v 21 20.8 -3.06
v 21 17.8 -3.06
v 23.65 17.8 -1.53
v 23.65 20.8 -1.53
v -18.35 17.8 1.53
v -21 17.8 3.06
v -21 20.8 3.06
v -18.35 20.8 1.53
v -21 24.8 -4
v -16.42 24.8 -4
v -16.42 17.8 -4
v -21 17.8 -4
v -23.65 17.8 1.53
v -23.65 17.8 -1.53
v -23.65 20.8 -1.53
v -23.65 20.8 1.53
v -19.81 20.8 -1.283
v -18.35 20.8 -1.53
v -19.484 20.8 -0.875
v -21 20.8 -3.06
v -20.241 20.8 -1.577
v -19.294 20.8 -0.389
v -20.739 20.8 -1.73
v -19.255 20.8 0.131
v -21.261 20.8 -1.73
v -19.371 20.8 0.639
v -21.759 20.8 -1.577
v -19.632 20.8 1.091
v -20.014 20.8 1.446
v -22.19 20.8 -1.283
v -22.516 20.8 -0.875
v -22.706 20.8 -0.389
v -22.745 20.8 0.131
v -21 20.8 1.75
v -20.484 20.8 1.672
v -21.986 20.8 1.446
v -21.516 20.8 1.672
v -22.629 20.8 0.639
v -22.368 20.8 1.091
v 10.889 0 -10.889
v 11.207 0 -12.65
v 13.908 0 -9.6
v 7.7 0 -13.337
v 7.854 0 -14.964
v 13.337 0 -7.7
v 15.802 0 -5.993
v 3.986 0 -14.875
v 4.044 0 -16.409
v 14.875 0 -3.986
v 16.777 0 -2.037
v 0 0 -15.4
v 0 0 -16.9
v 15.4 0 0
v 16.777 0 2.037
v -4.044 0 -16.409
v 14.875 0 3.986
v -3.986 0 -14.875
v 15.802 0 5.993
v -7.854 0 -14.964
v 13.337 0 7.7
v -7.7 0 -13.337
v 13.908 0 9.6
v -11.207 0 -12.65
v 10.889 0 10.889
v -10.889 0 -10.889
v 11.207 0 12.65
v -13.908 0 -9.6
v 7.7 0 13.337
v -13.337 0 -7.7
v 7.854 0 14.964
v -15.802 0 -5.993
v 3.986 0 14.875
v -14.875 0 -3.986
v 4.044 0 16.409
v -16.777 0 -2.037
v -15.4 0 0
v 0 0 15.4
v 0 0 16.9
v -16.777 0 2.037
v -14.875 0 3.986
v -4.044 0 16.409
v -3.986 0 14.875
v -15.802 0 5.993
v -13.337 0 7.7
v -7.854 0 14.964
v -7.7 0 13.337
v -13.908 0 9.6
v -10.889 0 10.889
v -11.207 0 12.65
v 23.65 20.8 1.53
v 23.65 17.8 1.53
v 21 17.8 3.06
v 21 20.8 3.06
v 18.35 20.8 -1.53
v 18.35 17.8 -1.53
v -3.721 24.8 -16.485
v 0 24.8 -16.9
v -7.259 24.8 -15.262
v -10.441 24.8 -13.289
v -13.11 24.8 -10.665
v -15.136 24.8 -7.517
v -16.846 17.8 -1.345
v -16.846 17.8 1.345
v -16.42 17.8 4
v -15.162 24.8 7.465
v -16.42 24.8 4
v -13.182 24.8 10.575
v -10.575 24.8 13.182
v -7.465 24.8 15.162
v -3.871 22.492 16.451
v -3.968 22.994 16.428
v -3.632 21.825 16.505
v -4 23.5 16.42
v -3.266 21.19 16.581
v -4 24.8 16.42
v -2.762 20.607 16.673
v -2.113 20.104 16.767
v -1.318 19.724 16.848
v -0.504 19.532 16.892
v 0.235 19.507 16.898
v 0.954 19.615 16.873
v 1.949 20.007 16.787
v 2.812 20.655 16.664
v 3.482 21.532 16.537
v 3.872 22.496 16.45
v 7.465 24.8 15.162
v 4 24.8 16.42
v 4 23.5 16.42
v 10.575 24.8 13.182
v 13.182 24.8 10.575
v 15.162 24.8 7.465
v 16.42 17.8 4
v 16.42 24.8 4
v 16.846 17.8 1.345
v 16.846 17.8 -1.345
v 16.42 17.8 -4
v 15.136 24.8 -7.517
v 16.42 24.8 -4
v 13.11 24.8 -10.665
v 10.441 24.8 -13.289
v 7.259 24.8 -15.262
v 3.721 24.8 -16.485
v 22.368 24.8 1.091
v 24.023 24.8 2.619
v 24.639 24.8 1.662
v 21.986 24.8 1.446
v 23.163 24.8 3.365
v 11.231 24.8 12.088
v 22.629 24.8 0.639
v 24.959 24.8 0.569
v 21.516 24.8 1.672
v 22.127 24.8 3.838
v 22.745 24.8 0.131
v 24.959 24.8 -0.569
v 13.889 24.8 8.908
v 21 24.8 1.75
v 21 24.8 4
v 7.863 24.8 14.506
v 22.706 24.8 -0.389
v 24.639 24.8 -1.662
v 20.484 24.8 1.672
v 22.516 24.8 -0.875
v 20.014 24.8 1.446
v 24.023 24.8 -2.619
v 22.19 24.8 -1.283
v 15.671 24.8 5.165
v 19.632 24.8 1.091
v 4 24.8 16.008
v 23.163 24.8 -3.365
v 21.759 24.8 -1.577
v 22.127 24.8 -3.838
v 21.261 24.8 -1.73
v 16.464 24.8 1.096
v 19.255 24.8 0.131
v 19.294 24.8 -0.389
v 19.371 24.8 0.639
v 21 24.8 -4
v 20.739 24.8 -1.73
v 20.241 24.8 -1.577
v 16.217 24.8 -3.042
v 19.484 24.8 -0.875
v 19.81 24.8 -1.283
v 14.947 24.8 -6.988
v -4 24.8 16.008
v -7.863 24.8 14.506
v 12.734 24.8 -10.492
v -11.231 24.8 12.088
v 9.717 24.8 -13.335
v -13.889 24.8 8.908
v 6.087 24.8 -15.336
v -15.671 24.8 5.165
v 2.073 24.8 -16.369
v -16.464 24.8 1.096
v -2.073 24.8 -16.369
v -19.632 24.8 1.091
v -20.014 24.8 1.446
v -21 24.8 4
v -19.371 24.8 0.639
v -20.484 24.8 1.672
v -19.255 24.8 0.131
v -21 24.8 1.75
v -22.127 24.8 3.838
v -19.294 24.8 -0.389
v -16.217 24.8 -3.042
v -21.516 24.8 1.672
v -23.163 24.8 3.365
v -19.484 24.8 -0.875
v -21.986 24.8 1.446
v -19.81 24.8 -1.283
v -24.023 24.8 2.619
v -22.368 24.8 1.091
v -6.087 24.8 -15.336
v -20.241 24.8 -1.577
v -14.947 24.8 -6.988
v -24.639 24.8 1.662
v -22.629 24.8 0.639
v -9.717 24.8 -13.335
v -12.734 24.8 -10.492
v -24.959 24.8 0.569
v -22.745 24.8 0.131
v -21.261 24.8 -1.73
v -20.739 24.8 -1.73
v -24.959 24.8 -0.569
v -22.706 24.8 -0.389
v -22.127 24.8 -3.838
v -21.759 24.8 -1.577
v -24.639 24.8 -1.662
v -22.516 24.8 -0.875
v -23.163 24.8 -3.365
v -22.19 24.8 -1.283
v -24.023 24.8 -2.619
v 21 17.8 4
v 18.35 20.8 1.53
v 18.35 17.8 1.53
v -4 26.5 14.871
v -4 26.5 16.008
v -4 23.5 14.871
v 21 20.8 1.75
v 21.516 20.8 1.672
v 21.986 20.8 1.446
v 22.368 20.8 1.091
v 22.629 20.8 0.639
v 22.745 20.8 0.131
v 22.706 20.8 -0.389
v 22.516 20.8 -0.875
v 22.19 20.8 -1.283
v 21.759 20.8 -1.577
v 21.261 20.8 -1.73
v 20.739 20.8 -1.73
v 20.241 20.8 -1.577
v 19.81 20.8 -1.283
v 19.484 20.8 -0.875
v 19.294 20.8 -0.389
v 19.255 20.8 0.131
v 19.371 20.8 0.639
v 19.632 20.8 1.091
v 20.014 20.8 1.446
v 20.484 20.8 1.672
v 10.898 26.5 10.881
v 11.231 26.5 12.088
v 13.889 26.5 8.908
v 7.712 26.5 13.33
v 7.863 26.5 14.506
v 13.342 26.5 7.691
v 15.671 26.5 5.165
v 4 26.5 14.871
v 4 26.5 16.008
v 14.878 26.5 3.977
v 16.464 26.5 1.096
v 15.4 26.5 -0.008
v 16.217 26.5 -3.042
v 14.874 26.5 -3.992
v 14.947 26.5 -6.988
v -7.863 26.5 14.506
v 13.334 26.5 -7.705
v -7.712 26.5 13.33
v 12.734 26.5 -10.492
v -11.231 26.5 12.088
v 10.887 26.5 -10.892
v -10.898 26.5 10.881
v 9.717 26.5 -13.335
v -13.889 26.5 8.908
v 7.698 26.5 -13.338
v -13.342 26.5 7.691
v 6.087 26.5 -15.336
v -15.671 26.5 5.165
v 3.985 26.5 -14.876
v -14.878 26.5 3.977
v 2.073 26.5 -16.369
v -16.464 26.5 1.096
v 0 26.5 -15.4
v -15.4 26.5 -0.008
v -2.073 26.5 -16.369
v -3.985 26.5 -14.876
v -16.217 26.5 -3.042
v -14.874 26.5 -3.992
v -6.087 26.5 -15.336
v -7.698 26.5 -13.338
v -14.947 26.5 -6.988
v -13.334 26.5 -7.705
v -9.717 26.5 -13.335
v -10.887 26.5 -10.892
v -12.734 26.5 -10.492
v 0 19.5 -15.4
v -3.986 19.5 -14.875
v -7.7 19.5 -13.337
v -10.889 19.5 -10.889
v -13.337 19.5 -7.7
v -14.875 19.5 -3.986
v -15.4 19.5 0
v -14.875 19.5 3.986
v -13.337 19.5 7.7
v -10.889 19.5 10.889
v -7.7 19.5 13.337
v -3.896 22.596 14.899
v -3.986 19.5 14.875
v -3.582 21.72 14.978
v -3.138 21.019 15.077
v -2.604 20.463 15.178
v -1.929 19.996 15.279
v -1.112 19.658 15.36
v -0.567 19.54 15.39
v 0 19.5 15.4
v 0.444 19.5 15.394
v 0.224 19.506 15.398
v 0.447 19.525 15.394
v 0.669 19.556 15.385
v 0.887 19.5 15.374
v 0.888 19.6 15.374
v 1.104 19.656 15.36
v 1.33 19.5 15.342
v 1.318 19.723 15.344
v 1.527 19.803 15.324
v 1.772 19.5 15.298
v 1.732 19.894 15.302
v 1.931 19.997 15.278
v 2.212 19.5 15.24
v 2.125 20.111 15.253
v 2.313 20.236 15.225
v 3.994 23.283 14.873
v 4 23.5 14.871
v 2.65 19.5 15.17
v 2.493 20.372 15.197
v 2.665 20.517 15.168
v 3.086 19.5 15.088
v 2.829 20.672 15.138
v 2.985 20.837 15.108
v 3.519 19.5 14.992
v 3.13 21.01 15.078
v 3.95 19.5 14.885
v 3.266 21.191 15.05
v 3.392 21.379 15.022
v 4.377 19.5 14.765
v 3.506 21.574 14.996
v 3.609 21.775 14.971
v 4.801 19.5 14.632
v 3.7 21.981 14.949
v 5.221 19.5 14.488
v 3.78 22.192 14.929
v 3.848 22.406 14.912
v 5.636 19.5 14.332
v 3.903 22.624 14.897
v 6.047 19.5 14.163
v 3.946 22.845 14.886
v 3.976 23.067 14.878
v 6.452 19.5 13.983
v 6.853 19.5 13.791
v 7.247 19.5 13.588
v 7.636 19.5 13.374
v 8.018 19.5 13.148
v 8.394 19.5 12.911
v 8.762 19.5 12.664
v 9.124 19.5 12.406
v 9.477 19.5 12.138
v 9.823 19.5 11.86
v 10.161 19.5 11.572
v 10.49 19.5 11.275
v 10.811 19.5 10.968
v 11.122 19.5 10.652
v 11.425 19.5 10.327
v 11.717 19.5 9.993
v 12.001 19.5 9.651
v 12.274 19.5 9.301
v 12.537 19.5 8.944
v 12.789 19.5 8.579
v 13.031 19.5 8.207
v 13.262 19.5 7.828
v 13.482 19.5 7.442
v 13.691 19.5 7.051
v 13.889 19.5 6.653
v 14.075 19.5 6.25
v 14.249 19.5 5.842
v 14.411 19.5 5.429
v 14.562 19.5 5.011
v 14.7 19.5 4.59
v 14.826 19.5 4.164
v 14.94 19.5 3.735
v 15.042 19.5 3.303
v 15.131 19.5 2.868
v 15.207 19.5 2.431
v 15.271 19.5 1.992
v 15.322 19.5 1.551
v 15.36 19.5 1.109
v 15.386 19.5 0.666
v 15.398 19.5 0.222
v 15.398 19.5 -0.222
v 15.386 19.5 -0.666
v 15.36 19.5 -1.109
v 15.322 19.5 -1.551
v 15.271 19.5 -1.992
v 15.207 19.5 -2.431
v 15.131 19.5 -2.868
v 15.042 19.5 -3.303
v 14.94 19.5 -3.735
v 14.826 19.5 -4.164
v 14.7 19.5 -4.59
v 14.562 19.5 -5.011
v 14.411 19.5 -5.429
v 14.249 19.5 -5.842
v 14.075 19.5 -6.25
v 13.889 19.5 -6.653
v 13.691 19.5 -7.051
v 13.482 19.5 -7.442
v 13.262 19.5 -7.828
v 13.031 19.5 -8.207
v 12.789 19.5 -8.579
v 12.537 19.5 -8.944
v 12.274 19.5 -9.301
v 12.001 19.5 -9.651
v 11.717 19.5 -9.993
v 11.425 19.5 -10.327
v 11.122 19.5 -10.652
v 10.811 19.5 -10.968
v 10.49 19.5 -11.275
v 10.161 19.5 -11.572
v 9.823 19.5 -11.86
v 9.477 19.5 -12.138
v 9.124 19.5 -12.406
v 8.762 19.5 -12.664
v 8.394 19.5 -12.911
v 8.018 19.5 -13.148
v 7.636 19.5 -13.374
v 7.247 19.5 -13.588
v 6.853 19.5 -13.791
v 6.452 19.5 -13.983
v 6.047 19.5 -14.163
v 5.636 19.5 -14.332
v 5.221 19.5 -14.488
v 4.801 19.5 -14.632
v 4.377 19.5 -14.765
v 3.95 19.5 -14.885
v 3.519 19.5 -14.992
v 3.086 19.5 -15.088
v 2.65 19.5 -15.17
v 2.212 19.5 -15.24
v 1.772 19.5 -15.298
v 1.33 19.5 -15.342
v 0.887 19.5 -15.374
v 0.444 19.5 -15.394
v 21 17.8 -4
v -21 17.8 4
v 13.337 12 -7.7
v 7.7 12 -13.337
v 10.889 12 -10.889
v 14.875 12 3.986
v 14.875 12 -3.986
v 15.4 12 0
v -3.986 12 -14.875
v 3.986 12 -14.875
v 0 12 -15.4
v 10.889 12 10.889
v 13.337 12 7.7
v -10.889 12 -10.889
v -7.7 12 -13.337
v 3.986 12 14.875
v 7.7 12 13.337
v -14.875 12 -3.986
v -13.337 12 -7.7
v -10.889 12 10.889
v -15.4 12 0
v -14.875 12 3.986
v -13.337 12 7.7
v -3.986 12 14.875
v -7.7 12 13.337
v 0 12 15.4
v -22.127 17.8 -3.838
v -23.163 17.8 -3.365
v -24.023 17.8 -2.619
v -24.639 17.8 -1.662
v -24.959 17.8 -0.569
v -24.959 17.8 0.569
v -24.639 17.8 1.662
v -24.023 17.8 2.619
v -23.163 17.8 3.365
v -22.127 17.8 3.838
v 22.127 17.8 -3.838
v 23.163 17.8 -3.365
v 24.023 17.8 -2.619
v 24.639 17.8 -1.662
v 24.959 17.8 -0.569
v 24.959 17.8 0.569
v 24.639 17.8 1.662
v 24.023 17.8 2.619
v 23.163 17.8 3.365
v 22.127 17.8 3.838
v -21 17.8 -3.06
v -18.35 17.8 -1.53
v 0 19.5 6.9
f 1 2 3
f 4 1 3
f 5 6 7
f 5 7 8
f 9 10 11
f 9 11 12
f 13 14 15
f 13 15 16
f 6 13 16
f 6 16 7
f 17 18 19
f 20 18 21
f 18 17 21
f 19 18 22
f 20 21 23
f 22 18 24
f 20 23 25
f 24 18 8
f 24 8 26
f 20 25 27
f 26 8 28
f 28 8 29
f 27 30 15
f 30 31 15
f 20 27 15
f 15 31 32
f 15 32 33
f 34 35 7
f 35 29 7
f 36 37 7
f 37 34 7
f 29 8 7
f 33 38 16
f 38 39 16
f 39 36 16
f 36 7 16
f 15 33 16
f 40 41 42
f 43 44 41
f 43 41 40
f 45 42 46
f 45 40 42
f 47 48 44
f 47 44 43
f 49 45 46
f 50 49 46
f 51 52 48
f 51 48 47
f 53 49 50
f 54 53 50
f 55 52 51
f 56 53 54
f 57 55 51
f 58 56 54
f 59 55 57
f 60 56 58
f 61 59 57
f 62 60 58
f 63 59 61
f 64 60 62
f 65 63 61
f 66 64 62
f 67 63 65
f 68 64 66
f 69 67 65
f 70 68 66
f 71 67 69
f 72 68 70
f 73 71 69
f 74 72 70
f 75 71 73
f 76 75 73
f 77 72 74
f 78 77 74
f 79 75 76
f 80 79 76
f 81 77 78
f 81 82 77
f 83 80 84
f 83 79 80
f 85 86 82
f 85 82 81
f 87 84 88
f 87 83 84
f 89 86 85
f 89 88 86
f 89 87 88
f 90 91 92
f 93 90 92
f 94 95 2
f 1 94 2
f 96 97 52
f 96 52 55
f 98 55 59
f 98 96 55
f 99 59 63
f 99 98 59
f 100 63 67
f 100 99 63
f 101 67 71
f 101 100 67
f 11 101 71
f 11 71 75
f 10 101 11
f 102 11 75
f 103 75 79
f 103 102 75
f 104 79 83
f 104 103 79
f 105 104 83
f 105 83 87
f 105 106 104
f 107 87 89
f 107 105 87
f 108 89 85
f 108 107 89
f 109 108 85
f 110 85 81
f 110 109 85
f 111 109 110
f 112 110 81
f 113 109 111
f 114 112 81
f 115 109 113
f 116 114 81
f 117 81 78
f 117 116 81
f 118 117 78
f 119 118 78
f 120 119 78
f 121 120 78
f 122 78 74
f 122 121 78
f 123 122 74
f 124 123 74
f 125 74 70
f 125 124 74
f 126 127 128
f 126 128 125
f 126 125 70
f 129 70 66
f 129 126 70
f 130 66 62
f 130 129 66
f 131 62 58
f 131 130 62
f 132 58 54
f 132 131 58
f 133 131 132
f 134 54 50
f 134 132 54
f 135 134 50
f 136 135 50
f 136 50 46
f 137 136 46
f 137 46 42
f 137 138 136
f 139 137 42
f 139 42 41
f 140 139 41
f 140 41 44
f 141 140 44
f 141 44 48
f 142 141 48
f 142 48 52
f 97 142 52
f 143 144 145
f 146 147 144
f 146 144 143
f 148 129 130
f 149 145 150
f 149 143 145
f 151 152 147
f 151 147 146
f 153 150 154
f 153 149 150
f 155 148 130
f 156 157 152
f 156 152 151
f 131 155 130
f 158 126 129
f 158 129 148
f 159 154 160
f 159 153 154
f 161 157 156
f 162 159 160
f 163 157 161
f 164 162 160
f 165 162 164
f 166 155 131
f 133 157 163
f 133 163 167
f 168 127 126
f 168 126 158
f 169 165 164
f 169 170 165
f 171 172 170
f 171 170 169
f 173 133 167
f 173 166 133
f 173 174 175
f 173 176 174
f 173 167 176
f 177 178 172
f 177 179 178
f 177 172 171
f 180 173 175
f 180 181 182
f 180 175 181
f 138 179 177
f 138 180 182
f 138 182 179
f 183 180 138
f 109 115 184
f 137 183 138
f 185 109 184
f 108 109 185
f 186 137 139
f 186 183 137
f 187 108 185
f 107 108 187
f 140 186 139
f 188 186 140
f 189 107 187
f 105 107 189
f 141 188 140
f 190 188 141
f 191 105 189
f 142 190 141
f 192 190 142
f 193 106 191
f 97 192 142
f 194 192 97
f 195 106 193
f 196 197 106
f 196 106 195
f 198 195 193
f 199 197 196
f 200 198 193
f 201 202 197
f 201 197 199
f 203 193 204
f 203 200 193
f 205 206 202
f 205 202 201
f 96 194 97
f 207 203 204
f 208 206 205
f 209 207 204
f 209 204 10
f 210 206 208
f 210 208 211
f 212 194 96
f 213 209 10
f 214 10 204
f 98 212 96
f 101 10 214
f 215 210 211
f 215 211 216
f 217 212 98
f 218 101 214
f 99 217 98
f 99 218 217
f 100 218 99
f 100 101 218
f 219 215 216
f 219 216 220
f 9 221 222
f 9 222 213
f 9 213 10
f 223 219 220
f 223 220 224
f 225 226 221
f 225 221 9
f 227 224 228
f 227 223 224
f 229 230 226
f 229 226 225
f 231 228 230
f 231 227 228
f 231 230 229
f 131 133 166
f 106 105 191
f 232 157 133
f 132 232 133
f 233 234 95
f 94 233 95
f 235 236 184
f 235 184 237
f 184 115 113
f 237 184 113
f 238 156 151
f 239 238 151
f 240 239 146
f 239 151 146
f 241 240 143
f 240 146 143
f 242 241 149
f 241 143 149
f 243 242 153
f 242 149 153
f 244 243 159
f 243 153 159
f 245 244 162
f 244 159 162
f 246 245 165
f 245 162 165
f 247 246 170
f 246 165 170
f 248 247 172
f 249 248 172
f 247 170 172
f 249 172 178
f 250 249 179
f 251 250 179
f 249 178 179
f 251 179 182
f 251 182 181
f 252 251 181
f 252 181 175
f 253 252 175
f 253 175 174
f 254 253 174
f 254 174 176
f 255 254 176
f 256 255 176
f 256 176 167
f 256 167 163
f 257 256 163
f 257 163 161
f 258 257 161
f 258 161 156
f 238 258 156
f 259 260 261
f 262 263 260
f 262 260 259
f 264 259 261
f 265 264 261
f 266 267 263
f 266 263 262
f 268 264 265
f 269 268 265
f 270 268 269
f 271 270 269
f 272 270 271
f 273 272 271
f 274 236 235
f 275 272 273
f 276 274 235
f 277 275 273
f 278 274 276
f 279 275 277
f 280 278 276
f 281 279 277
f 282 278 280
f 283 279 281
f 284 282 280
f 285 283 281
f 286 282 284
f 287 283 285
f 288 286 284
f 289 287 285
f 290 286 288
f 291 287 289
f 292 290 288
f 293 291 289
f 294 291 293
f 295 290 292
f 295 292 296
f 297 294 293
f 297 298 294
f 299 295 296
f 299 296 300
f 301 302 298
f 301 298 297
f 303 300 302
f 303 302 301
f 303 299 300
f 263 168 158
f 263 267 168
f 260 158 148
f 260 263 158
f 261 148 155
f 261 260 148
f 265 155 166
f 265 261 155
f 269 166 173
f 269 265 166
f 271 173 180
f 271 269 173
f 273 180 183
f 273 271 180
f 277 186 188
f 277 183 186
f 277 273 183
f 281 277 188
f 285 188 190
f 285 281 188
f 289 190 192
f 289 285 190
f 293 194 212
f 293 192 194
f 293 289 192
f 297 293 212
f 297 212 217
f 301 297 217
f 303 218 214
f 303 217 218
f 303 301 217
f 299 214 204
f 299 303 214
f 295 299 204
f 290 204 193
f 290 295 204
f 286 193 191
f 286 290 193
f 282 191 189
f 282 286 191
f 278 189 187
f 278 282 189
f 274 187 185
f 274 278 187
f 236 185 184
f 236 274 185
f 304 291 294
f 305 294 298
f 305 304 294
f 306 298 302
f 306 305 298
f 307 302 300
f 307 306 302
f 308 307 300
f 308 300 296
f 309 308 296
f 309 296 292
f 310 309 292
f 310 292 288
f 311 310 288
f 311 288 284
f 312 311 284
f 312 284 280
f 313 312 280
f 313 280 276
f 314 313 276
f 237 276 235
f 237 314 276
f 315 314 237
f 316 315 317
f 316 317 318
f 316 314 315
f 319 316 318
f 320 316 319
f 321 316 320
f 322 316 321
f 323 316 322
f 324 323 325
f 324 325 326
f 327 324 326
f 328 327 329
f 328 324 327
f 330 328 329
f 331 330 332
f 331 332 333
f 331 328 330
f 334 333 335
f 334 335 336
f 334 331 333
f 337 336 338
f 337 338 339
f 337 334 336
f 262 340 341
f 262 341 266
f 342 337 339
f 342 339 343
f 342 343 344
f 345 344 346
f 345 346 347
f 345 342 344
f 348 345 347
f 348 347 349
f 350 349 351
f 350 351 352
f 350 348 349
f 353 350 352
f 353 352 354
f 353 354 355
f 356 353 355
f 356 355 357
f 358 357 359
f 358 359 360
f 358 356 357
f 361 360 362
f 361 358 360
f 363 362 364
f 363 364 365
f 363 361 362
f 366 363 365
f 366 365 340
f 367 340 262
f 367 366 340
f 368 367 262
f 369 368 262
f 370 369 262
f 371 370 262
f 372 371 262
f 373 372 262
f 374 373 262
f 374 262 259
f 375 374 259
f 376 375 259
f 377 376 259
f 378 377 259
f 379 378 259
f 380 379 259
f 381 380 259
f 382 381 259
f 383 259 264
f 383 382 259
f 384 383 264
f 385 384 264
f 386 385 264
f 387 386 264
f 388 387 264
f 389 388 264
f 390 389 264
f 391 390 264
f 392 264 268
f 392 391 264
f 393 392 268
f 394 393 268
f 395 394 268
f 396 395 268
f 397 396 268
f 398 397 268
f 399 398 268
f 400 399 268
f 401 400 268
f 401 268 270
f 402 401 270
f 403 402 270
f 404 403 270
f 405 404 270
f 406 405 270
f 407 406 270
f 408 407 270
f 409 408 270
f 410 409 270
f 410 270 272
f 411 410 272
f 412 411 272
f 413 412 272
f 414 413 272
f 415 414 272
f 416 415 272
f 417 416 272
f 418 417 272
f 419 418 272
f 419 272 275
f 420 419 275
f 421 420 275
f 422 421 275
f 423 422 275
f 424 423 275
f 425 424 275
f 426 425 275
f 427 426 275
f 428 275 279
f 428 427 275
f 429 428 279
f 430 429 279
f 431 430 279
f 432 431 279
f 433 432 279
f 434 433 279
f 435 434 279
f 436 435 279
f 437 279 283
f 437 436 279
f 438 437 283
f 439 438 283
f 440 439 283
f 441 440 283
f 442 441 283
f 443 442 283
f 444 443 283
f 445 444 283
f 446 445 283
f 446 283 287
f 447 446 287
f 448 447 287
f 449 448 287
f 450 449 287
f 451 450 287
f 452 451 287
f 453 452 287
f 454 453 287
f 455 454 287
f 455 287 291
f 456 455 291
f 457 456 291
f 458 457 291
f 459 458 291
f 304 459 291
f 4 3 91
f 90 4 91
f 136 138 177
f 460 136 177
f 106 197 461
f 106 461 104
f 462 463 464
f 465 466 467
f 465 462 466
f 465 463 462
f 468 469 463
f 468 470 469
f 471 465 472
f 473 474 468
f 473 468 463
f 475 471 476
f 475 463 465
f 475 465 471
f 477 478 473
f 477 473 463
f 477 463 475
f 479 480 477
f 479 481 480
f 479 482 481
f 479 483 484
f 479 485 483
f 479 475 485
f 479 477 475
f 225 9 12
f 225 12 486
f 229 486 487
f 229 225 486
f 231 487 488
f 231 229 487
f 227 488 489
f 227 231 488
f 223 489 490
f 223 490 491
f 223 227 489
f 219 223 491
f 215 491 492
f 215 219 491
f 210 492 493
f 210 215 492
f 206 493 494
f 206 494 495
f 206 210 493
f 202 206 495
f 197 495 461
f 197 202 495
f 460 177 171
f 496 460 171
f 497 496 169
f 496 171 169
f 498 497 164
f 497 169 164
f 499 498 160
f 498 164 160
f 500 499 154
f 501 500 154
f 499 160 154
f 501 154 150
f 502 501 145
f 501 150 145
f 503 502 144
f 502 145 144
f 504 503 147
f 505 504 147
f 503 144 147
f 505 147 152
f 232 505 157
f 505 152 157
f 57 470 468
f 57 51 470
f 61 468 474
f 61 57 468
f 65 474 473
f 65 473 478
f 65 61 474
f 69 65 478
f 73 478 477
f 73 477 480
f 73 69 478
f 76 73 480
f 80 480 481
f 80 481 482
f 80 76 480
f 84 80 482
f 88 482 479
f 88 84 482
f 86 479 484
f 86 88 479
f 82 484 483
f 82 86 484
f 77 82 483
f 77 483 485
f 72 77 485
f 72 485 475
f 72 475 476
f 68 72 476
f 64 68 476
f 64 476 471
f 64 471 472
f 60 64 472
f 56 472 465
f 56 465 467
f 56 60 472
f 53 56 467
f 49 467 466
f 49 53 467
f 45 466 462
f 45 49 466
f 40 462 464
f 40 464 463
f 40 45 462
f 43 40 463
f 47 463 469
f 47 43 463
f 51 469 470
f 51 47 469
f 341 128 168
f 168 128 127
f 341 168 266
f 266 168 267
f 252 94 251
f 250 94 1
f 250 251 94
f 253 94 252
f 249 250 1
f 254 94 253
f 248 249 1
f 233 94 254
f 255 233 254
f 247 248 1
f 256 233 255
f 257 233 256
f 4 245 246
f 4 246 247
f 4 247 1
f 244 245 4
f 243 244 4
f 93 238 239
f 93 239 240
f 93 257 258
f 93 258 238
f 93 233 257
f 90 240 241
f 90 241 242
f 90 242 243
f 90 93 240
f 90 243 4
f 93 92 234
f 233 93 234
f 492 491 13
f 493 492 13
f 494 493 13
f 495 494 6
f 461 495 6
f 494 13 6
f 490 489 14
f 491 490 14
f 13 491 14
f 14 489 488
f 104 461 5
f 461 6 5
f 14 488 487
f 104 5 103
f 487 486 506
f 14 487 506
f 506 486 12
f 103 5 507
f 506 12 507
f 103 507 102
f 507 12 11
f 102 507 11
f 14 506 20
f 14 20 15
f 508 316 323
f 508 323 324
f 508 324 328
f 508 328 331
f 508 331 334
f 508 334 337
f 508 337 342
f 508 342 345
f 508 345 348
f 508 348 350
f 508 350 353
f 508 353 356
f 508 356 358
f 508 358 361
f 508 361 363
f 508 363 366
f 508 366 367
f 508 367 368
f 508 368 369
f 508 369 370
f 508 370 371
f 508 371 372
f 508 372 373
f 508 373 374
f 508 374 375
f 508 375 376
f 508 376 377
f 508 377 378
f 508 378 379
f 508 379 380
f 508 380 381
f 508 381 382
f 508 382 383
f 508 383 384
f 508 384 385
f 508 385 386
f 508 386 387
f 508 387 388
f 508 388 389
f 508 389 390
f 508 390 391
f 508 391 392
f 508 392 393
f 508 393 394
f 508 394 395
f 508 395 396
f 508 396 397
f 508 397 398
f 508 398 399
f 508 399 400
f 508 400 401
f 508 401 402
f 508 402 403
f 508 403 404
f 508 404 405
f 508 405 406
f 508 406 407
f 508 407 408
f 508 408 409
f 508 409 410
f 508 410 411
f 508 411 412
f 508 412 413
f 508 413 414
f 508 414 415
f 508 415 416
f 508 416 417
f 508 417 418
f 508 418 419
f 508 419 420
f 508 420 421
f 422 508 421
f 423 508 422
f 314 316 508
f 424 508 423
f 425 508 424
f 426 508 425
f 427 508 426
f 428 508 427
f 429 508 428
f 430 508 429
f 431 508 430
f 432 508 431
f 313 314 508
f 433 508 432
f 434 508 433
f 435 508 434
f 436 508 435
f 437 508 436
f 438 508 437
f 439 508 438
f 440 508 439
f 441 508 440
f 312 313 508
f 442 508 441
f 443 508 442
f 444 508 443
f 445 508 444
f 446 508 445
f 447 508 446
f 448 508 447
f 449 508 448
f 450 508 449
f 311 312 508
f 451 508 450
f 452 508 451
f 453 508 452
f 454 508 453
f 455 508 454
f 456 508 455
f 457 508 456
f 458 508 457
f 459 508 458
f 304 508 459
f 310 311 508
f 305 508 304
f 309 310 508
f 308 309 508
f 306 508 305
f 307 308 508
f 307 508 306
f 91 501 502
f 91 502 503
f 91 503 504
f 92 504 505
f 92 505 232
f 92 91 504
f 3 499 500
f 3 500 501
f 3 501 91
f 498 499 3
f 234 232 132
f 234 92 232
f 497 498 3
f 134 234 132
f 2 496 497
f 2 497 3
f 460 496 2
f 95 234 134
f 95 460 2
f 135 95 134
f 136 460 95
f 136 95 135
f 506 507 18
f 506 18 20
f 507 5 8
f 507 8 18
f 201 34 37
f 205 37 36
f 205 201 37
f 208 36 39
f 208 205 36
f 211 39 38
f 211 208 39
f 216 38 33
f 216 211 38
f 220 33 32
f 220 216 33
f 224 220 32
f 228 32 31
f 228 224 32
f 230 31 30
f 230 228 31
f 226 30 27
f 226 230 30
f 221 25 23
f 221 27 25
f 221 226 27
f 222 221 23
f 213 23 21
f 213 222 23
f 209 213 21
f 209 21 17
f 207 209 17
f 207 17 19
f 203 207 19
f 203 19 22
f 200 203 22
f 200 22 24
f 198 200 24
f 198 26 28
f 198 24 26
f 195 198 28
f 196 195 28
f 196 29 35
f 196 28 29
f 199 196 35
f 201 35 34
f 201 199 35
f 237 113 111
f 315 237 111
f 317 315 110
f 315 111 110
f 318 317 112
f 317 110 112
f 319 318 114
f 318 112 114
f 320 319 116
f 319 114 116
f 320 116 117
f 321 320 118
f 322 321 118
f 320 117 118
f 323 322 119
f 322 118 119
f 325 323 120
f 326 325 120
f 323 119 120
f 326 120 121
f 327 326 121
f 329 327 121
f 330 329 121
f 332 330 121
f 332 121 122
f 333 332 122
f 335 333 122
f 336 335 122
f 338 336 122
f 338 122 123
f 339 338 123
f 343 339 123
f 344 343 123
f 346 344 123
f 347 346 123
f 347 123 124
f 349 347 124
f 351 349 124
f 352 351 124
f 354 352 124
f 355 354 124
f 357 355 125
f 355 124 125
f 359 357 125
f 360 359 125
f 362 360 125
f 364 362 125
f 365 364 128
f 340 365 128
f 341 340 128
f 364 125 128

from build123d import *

# Parameters (mm, degrees)
CUT_EXTRUDE1_DEPTH  = 10
SKETCH4_R           = 1.75
BOSS_EXTRUDE1_DEPTH = 7
CUT_EXTRUDE2_DEPTH  = 3


with BuildPart() as part:
    # Sketch1 → Revolve1 (revolve)
    with BuildSketch(Plane.XY, mode=Mode.PRIVATE) as revolve1_sk:
        Polygon((0, 12), (15.4, 12), (15.4, 0), (16.9, 0), (16.9, 24.8), (16.5, 24.8), (16.5, 26.5), (15.4, 26.5), (15.4, 19.5), (0, 19.5), align=None)
    revolve(revolve1_sk.sketch.rotate(Axis((0, 0, 0), (0, 1, 0)), 90), axis=Axis((0, 0, 0), (0, 1, 0)))

    # Sketch3 → Cut-Extrude1 (cut)
    with BuildSketch(Plane.XY.offset(16.9)):
        with BuildLine():
            Line((-4, 26.5), (-4, 23.5))
            ThreePointArc((-4, 23.5), (0, 19.5), (4, 23.5))
            Line((4, 23.5), (4, 26.5))
            Line((4, 26.5), (-4, 26.5))
        make_face()
    extrude(amount=-CUT_EXTRUDE1_DEPTH, mode=Mode.SUBTRACT)

    # Sketch4 → Boss-Extrude1 (add)
    with BuildSketch(Plane(origin=(0, 24.8, 0), x_dir=(1, 0, 0), z_dir=(0, 1, 0))):
        with BuildLine():
            Line((21, -4), (16.419805115, -4))
            ThreePointArc((16.419805115, -4), (16.9, 0), (16.419805115, 4))
            Line((16.419805115, 4), (21, 4))
            ThreePointArc((21, 4), (25, 0), (21, -4))
        make_face()
        with Locations(Location((21, 0, 0), (0, 0, 270))):
            Circle(SKETCH4_R, mode=Mode.SUBTRACT)
    boss_extrude1 = extrude(amount=-BOSS_EXTRUDE1_DEPTH)

    # Sketch5 → Cut-Extrude2 (cut)
    with BuildSketch(Plane.XZ.offset(-17.8)):
        Polygon((18.35, -1.529978213), (21, -3.059956427), (23.65, -1.529978213), (23.65, 1.529978213), (21, 3.059956427), (18.35, 1.529978213), align=None)
    cut_extrude2 = extrude(amount=-CUT_EXTRUDE2_DEPTH, mode=Mode.SUBTRACT)

    # Mirror1: Boss-Extrude1, Cut-Extrude2 across plane
    add(boss_extrude1.mirror(Plane(origin=(0, 0, 0), x_dir=(0, 0, 1), z_dir=(1, 0, 0))))
    add(cut_extrude2.mirror(Plane(origin=(0, 0, 0), x_dir=(0, 0, 1), z_dir=(1, 0, 0))), mode=Mode.SUBTRACT)


solid = part.part
